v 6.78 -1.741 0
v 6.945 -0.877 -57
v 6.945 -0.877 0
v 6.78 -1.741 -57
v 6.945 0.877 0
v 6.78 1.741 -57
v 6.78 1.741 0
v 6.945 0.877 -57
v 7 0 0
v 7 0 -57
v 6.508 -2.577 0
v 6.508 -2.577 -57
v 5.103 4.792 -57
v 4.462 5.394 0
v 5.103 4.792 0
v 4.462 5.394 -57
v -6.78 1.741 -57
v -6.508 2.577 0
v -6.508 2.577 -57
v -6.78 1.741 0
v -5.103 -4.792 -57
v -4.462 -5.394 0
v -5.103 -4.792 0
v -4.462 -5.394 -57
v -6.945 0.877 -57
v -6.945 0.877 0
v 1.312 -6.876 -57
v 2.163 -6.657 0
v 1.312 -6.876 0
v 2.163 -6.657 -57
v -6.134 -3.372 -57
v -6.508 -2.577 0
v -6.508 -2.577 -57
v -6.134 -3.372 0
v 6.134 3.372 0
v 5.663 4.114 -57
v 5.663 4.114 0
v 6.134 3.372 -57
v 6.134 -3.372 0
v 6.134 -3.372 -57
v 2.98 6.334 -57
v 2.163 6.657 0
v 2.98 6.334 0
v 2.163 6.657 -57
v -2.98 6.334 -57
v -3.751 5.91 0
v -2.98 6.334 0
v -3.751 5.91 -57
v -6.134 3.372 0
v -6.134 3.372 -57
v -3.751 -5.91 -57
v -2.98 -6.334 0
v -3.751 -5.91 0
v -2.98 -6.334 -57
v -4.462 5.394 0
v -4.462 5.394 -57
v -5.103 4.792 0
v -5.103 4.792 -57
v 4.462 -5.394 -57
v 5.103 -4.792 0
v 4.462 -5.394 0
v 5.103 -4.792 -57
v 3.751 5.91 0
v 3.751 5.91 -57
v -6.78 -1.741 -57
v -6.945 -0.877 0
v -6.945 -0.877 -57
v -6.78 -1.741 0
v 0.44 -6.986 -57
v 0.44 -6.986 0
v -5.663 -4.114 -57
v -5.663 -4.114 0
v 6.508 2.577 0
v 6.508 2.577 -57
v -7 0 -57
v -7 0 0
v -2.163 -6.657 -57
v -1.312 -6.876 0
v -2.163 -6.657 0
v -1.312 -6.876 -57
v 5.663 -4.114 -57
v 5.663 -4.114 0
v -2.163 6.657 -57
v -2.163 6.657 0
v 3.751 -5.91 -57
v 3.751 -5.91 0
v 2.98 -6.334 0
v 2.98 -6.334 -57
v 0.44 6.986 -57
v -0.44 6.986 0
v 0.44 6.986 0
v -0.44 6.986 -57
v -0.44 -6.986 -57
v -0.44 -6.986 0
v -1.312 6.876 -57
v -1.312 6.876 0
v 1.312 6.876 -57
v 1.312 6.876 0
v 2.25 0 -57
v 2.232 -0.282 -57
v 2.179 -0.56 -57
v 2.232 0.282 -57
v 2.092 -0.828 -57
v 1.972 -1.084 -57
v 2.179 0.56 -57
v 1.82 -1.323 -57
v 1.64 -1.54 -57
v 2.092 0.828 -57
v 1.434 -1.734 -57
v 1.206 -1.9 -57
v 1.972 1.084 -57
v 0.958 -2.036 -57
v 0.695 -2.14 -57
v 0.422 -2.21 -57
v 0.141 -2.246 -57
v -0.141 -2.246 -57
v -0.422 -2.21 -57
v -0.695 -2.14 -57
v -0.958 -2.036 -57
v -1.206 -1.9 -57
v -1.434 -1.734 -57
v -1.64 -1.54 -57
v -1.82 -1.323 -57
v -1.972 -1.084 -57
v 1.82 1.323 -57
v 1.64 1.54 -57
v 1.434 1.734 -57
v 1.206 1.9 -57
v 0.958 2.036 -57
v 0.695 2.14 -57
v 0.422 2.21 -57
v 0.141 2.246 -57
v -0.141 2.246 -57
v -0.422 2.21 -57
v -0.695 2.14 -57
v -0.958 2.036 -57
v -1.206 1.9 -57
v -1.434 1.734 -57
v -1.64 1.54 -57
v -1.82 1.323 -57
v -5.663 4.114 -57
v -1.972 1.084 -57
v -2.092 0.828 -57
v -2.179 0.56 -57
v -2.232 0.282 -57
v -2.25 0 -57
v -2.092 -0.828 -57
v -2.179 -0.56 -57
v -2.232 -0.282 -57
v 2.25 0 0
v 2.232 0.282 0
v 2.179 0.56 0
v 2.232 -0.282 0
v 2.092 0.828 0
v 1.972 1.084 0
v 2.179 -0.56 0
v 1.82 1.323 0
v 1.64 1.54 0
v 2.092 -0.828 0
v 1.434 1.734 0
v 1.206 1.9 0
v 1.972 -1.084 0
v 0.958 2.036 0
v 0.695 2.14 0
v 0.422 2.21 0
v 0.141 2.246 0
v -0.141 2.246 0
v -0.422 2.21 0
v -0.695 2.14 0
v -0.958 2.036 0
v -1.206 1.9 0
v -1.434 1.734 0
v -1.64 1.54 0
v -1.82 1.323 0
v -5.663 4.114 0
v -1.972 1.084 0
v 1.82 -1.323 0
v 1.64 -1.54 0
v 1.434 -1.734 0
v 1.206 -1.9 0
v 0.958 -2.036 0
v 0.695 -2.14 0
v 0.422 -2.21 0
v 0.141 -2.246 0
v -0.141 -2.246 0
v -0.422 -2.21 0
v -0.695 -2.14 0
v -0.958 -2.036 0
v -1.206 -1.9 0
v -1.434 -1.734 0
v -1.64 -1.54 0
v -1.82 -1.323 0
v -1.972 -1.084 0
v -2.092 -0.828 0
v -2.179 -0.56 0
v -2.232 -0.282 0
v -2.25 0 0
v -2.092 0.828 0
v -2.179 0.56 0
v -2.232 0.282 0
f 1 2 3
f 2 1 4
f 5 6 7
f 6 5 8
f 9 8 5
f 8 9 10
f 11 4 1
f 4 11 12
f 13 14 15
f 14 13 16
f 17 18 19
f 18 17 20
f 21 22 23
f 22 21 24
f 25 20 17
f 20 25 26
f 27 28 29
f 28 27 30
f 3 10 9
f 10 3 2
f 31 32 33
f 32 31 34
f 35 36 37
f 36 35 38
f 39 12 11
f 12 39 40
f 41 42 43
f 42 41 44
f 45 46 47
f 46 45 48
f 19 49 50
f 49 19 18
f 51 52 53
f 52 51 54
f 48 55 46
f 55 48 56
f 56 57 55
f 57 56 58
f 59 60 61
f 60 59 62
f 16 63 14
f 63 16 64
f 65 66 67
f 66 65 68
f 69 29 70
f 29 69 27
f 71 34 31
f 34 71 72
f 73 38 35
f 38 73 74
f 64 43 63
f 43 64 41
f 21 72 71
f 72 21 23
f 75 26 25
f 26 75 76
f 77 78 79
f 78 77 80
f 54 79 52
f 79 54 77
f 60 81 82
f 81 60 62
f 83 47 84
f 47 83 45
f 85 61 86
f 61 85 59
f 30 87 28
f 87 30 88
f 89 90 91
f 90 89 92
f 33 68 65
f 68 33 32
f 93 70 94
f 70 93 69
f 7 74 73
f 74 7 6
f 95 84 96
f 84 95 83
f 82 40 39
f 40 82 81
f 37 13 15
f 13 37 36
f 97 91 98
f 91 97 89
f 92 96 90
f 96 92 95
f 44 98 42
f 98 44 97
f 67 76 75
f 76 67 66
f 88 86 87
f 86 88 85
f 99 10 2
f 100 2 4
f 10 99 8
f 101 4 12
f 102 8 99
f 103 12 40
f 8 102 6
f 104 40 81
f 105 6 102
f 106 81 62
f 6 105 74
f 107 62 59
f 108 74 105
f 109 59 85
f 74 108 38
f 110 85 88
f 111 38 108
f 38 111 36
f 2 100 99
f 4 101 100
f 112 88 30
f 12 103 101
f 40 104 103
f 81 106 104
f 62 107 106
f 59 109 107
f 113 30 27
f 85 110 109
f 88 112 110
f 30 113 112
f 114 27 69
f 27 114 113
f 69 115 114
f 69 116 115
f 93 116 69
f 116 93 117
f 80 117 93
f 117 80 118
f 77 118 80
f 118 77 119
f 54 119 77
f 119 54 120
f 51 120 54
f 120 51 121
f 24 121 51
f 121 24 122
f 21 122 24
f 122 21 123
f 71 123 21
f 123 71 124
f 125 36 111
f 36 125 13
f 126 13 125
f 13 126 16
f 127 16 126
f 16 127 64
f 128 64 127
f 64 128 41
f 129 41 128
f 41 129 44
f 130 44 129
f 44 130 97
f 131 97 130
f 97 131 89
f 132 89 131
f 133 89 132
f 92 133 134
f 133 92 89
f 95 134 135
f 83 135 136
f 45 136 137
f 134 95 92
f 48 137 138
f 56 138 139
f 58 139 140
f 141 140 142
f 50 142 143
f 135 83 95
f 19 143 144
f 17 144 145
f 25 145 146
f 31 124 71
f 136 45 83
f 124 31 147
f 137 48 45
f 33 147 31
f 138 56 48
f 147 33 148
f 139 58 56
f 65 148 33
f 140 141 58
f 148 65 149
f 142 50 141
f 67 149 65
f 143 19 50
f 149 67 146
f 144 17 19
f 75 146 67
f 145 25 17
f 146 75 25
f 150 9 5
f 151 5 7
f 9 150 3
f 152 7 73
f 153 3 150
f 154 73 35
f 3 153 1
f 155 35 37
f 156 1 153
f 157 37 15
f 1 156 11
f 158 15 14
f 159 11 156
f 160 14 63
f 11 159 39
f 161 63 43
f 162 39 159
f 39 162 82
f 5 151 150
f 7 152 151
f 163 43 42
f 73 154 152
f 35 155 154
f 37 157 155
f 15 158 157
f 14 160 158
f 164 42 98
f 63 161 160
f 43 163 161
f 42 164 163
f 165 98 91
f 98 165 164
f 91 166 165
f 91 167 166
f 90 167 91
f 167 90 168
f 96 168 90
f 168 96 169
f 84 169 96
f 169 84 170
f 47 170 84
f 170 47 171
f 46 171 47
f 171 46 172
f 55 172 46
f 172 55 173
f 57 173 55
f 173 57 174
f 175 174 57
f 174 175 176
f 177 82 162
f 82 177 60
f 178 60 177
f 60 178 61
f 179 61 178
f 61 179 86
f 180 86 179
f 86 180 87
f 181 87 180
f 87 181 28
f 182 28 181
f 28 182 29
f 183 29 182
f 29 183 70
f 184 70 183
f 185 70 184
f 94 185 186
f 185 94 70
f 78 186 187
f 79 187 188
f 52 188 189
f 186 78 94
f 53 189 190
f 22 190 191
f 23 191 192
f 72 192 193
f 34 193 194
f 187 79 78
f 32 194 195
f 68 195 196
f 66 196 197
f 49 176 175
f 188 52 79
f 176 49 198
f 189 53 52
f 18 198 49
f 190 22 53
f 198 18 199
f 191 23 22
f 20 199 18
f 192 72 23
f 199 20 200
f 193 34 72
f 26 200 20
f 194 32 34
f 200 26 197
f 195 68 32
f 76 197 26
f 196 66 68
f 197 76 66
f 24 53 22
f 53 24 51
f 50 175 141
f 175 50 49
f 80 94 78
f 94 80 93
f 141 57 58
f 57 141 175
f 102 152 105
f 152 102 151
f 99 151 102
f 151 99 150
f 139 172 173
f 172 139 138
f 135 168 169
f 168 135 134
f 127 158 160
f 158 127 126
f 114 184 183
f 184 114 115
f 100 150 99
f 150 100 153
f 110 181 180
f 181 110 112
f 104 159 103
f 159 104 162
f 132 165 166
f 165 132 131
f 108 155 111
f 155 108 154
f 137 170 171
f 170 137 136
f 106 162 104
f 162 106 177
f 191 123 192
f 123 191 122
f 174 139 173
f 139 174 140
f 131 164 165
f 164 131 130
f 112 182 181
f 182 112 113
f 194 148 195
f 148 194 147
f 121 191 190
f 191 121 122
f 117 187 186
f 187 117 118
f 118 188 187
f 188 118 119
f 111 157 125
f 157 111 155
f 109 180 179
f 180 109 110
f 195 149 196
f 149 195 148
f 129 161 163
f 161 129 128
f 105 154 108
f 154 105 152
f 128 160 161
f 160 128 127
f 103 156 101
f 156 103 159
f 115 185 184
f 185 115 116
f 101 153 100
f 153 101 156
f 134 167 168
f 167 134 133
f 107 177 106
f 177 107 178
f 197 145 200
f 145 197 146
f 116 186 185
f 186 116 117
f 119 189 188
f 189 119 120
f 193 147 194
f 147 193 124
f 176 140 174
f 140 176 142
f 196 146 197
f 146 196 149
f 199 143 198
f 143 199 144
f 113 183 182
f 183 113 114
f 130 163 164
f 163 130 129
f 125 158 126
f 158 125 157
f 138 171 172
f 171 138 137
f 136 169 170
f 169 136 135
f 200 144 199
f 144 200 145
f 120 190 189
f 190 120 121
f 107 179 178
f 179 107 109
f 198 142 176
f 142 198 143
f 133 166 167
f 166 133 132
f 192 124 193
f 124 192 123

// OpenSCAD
$fn = 50;


difference() {
	union() {
		translate(v = [0, 0, -57.0000000000]) {
			cylinder(h = 57, r = 7.0000000000);
		}
		cylinder(h = 0, r = 10.0000000000);
	}
	union() {
		#translate(v = [0, 0, -57]) {
			cylinder(h = 57, r = 2.2500000000);
		}
	}
}
